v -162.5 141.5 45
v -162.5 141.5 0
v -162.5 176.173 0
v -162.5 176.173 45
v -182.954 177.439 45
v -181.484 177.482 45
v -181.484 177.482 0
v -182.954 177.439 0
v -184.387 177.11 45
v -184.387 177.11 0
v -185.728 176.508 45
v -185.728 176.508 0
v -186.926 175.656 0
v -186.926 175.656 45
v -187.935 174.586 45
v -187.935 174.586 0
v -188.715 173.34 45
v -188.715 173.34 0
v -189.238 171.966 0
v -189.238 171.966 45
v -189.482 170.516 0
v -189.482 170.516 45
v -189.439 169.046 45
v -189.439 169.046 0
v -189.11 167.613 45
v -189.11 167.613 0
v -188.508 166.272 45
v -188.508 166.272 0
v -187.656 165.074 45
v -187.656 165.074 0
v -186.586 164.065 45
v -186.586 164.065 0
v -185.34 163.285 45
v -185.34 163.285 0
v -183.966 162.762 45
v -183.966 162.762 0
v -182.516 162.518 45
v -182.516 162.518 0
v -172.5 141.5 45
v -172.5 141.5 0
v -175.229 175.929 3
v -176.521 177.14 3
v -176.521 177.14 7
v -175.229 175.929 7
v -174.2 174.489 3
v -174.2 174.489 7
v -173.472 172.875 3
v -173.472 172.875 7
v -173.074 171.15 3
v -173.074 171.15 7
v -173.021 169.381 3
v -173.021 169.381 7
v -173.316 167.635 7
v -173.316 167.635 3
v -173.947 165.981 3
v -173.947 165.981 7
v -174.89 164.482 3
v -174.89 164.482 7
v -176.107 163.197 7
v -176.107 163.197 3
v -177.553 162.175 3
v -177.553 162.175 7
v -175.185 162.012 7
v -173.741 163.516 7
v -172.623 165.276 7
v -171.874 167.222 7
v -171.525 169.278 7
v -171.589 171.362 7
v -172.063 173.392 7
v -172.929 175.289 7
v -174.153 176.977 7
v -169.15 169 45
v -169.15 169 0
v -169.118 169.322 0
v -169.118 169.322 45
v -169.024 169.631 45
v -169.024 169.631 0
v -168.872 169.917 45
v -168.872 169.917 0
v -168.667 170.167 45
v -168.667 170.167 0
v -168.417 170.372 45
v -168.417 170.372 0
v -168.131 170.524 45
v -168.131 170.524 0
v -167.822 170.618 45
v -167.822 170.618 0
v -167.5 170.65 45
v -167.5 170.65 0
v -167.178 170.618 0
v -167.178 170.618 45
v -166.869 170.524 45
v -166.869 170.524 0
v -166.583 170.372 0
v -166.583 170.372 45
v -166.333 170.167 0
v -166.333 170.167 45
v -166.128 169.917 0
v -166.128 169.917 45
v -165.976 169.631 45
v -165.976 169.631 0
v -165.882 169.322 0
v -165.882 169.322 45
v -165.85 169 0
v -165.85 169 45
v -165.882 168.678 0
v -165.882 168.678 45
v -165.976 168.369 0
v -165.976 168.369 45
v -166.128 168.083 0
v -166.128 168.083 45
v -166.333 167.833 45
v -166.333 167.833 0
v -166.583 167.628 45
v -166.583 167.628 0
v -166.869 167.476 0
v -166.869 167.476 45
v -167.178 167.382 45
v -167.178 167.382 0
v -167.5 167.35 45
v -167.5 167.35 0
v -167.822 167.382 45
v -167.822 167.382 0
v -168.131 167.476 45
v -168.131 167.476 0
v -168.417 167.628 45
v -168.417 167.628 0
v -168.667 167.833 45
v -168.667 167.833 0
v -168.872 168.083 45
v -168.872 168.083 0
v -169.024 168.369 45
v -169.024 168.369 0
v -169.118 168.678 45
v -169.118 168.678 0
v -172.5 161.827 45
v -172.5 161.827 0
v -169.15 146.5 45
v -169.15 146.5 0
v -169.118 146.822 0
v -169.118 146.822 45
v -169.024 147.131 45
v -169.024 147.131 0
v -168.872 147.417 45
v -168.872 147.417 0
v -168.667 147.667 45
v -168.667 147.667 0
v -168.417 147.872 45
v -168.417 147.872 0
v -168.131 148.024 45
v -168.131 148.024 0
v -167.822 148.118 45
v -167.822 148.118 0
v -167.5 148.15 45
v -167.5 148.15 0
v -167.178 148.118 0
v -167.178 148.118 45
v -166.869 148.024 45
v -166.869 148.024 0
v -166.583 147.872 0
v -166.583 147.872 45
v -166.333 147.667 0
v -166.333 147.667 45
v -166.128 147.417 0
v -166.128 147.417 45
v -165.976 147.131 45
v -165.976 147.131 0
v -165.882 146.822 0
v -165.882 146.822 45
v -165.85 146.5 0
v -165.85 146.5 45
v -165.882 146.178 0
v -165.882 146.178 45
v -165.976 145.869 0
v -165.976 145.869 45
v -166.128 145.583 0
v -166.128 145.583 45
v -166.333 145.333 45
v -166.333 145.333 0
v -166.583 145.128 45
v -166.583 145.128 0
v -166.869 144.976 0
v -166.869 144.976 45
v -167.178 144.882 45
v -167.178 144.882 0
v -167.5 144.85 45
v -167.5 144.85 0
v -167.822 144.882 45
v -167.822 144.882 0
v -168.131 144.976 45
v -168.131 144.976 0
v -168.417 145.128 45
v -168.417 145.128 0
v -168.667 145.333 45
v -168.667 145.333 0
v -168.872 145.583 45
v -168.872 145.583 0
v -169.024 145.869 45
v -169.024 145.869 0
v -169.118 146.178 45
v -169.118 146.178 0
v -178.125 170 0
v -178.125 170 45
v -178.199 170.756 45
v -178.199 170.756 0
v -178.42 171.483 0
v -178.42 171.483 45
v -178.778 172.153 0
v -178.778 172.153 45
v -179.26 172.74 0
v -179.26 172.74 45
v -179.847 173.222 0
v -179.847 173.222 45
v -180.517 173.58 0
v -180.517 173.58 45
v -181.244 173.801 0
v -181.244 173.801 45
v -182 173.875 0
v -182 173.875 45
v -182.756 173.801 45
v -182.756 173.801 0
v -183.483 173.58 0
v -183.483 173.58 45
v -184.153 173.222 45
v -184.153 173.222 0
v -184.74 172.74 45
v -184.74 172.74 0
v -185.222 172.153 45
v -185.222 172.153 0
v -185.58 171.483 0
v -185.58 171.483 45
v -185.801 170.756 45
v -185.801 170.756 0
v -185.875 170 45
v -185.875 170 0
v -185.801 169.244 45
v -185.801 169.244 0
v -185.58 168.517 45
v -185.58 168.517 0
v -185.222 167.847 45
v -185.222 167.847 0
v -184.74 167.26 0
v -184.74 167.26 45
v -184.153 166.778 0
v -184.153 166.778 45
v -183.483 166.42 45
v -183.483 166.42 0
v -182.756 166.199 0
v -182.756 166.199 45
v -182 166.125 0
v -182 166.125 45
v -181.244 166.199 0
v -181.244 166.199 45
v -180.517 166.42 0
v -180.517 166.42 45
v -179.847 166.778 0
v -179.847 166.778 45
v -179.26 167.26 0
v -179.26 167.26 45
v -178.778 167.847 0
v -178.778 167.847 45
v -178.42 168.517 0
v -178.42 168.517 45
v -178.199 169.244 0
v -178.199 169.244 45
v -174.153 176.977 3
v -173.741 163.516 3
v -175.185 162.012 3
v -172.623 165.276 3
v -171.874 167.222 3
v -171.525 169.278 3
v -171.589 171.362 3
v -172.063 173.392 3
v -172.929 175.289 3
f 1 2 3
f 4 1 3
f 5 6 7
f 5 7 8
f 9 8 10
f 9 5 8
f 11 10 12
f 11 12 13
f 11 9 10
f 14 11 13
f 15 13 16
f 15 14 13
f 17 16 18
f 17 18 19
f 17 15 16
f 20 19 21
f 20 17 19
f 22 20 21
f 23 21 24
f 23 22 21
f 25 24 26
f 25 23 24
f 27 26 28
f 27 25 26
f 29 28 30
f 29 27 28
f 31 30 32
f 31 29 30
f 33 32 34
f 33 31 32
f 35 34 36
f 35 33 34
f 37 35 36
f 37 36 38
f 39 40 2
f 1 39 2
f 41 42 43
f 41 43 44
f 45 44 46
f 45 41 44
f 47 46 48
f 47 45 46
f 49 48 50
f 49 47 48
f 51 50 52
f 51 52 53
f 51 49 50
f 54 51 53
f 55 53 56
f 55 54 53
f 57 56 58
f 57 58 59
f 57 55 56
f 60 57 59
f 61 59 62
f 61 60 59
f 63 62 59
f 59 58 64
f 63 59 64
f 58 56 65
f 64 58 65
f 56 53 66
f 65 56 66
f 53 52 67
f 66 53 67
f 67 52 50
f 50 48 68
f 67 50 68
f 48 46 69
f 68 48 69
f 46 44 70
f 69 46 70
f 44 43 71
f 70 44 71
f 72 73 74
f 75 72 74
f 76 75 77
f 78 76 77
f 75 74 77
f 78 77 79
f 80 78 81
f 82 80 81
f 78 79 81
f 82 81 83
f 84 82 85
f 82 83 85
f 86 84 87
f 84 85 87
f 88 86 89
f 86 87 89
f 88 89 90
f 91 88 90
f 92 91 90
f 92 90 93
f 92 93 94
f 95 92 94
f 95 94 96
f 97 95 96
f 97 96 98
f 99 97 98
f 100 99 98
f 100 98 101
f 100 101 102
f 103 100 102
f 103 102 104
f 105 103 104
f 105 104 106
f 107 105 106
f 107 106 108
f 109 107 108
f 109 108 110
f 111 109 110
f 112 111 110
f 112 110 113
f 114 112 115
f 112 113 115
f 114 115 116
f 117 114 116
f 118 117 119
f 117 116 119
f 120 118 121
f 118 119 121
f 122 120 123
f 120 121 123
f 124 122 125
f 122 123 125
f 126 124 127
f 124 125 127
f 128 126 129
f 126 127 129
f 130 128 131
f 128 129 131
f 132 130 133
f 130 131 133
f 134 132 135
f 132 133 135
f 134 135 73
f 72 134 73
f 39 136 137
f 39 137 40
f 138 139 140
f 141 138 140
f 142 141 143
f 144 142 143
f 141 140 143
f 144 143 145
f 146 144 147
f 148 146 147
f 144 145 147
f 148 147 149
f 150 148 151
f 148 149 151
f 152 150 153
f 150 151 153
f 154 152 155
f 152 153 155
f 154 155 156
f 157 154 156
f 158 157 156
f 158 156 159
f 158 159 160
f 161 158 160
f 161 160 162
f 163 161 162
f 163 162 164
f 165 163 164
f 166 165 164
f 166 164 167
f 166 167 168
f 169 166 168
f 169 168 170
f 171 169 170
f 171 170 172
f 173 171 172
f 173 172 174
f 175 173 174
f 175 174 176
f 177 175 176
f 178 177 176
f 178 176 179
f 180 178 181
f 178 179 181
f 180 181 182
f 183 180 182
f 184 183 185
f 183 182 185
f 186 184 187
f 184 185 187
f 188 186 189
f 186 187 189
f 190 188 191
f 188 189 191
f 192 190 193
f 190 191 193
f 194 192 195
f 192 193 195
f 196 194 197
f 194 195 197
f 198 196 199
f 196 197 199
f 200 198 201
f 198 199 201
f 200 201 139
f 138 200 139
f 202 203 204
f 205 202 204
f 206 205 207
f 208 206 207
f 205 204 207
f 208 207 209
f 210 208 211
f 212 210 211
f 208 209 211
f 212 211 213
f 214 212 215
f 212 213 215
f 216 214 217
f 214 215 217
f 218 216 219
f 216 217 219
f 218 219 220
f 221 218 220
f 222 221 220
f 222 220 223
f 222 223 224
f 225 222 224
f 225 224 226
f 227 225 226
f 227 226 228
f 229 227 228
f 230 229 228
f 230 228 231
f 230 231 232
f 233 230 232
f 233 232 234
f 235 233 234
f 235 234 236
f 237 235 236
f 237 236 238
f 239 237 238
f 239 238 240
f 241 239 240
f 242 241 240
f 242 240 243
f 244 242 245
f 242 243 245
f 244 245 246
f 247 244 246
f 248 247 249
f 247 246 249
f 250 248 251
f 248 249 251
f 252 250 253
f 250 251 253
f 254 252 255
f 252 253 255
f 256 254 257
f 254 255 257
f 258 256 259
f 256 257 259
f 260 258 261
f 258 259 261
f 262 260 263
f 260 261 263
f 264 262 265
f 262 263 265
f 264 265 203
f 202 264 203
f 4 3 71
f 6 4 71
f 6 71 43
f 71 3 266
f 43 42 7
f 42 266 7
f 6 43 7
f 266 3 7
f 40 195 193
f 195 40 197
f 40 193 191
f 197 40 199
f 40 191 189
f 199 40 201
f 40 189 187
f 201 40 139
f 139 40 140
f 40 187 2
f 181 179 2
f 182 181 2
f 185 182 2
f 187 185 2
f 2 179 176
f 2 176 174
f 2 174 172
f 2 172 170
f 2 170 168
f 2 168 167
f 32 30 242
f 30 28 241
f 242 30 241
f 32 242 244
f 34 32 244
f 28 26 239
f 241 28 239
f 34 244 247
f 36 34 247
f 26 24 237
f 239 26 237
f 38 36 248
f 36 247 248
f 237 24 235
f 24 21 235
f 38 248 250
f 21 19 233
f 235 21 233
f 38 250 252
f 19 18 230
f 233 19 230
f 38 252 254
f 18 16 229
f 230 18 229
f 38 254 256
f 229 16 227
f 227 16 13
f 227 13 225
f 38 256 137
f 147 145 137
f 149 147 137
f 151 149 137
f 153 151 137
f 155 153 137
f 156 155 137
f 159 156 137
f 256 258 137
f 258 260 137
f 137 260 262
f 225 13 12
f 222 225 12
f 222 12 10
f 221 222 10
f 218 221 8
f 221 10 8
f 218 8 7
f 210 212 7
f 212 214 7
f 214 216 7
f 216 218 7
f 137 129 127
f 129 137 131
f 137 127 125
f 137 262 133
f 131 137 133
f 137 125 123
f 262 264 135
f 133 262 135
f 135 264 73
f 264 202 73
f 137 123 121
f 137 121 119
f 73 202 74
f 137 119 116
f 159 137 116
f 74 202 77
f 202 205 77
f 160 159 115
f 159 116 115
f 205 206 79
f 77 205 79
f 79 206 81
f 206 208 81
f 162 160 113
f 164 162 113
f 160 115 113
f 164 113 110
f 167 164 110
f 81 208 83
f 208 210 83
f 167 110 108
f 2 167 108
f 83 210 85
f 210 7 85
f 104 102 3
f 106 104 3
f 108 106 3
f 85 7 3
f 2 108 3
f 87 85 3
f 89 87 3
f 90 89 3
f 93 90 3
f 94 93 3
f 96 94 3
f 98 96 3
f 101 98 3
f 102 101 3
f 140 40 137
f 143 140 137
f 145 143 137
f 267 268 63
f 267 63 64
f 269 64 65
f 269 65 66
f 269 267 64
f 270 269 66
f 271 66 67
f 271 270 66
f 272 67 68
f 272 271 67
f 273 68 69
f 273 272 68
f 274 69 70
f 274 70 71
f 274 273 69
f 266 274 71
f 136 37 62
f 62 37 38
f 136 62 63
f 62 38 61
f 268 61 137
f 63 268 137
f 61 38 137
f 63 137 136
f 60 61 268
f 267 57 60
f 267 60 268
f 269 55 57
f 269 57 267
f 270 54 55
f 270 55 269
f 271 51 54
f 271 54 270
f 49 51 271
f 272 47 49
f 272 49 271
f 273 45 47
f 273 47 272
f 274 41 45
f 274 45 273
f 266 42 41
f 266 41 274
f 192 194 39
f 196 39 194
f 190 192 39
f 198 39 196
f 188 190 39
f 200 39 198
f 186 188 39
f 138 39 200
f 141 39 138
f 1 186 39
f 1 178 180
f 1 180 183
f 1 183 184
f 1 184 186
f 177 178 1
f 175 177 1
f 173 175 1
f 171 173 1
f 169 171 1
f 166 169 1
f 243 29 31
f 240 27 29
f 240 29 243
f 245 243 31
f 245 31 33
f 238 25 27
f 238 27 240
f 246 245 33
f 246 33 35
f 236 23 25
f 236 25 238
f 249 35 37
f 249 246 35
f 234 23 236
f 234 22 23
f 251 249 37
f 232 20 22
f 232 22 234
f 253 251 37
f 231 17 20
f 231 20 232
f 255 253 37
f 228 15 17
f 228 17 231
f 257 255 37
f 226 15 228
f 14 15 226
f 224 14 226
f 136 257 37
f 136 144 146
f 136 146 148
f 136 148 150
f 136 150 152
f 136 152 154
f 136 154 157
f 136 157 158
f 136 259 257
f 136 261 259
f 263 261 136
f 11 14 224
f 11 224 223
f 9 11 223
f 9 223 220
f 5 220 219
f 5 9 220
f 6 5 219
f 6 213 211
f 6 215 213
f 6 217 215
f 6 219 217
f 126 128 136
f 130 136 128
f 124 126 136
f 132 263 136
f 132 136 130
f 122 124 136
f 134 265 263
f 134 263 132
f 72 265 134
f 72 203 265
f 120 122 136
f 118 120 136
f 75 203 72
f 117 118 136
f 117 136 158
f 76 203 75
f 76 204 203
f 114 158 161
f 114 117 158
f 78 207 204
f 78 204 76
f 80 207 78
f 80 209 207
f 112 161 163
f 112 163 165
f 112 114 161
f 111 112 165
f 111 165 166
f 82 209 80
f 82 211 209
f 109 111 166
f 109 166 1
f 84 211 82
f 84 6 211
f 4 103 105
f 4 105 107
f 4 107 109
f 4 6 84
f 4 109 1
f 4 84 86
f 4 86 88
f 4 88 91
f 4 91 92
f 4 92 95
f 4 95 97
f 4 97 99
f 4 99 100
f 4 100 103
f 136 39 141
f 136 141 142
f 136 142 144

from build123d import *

# Parameters (mm, degrees)
BOSS_EXTRUDE1_DEPTH   = 45
CUT_EXTRUDE1_START    = -5
CUT_EXTRUDE1_DEPTH    = 2
M4X0_7_TAPPED_HOLE1_D = 3.3
SKETCH5_R             = 7.5
BOSS_EXTRUDE2_DEPTH   = 45
SKETCH6_R             = 3.875
CUT_EXTRUDE2_DEPTH    = 46


with BuildPart() as part:
    # Sketch1 → Boss-Extrude1 (new body)
    with BuildSketch(Plane.XY):
        with BuildLine():
            Line((-182.516015687, 162.517772537), (-172.5, 161.827012834))
            Line((-172.5, 161.827012834), (-172.5, 141.5))
            Line((-172.5, 141.5), (-162.5, 141.5))
            Line((-162.5, 141.5), (-162.5, 176.172987166))
            Line((-162.5, 176.172987166), (-181.483984313, 177.482227463))
            ThreePointArc((-181.483984313, 177.482227463), (-174.517772537, 169.483984313), (-182.516015687, 162.517772537))
        make_face()
    extrude(amount=BOSS_EXTRUDE1_DEPTH)

    # Sketch2 → Cut-Extrude1 (cut, symmetric)
    with BuildSketch(Plane(origin=(0, 0, 0), x_dir=(-1, 0, 0), z_dir=(0, 0, -1)).offset(CUT_EXTRUDE1_START)):
        with BuildLine():
            ThreePointArc((176.520836095, 177.139941379), (173.021327044, 169.380781175), (177.552867469, 162.175486453))
            ThreePointArc((177.552867469, 162.175486453), (177.834315887, 161.15284928), (176.811678714, 160.871400862))
            ThreePointArc((176.811678714, 160.871400862), (171.524881552, 169.277578038), (175.60764211, 178.329931609))
            ThreePointArc((175.60764211, 178.329931609), (176.659234217, 178.191533486), (176.520836095, 177.139941379))
        make_face()
    extrude(amount=CUT_EXTRUDE1_DEPTH, both=True, mode=Mode.SUBTRACT)

    # M4x0.7 Tapped Hole1 (through all)
    with Locations(Plane.XY.offset(45)):
        with Locations((-167.5, 169), (-167.5, 146.5)):
            Hole(M4X0_7_TAPPED_HOLE1_D / 2)

    # Sketch5 → Boss-Extrude2 (add, through all)
    with BuildSketch(Plane.XY.offset(45)):
        with Locations((-182, 170)):
            Circle(SKETCH5_R)
    extrude(amount=-BOSS_EXTRUDE2_DEPTH)

    # Sketch6 → Cut-Extrude2 (cut, through all)
    with BuildSketch(Plane.XY.offset(45)):
        with Locations((-182, 170)):
            Circle(SKETCH6_R)
    extrude(amount=-CUT_EXTRUDE2_DEPTH, mode=Mode.SUBTRACT)


solid = part.part
